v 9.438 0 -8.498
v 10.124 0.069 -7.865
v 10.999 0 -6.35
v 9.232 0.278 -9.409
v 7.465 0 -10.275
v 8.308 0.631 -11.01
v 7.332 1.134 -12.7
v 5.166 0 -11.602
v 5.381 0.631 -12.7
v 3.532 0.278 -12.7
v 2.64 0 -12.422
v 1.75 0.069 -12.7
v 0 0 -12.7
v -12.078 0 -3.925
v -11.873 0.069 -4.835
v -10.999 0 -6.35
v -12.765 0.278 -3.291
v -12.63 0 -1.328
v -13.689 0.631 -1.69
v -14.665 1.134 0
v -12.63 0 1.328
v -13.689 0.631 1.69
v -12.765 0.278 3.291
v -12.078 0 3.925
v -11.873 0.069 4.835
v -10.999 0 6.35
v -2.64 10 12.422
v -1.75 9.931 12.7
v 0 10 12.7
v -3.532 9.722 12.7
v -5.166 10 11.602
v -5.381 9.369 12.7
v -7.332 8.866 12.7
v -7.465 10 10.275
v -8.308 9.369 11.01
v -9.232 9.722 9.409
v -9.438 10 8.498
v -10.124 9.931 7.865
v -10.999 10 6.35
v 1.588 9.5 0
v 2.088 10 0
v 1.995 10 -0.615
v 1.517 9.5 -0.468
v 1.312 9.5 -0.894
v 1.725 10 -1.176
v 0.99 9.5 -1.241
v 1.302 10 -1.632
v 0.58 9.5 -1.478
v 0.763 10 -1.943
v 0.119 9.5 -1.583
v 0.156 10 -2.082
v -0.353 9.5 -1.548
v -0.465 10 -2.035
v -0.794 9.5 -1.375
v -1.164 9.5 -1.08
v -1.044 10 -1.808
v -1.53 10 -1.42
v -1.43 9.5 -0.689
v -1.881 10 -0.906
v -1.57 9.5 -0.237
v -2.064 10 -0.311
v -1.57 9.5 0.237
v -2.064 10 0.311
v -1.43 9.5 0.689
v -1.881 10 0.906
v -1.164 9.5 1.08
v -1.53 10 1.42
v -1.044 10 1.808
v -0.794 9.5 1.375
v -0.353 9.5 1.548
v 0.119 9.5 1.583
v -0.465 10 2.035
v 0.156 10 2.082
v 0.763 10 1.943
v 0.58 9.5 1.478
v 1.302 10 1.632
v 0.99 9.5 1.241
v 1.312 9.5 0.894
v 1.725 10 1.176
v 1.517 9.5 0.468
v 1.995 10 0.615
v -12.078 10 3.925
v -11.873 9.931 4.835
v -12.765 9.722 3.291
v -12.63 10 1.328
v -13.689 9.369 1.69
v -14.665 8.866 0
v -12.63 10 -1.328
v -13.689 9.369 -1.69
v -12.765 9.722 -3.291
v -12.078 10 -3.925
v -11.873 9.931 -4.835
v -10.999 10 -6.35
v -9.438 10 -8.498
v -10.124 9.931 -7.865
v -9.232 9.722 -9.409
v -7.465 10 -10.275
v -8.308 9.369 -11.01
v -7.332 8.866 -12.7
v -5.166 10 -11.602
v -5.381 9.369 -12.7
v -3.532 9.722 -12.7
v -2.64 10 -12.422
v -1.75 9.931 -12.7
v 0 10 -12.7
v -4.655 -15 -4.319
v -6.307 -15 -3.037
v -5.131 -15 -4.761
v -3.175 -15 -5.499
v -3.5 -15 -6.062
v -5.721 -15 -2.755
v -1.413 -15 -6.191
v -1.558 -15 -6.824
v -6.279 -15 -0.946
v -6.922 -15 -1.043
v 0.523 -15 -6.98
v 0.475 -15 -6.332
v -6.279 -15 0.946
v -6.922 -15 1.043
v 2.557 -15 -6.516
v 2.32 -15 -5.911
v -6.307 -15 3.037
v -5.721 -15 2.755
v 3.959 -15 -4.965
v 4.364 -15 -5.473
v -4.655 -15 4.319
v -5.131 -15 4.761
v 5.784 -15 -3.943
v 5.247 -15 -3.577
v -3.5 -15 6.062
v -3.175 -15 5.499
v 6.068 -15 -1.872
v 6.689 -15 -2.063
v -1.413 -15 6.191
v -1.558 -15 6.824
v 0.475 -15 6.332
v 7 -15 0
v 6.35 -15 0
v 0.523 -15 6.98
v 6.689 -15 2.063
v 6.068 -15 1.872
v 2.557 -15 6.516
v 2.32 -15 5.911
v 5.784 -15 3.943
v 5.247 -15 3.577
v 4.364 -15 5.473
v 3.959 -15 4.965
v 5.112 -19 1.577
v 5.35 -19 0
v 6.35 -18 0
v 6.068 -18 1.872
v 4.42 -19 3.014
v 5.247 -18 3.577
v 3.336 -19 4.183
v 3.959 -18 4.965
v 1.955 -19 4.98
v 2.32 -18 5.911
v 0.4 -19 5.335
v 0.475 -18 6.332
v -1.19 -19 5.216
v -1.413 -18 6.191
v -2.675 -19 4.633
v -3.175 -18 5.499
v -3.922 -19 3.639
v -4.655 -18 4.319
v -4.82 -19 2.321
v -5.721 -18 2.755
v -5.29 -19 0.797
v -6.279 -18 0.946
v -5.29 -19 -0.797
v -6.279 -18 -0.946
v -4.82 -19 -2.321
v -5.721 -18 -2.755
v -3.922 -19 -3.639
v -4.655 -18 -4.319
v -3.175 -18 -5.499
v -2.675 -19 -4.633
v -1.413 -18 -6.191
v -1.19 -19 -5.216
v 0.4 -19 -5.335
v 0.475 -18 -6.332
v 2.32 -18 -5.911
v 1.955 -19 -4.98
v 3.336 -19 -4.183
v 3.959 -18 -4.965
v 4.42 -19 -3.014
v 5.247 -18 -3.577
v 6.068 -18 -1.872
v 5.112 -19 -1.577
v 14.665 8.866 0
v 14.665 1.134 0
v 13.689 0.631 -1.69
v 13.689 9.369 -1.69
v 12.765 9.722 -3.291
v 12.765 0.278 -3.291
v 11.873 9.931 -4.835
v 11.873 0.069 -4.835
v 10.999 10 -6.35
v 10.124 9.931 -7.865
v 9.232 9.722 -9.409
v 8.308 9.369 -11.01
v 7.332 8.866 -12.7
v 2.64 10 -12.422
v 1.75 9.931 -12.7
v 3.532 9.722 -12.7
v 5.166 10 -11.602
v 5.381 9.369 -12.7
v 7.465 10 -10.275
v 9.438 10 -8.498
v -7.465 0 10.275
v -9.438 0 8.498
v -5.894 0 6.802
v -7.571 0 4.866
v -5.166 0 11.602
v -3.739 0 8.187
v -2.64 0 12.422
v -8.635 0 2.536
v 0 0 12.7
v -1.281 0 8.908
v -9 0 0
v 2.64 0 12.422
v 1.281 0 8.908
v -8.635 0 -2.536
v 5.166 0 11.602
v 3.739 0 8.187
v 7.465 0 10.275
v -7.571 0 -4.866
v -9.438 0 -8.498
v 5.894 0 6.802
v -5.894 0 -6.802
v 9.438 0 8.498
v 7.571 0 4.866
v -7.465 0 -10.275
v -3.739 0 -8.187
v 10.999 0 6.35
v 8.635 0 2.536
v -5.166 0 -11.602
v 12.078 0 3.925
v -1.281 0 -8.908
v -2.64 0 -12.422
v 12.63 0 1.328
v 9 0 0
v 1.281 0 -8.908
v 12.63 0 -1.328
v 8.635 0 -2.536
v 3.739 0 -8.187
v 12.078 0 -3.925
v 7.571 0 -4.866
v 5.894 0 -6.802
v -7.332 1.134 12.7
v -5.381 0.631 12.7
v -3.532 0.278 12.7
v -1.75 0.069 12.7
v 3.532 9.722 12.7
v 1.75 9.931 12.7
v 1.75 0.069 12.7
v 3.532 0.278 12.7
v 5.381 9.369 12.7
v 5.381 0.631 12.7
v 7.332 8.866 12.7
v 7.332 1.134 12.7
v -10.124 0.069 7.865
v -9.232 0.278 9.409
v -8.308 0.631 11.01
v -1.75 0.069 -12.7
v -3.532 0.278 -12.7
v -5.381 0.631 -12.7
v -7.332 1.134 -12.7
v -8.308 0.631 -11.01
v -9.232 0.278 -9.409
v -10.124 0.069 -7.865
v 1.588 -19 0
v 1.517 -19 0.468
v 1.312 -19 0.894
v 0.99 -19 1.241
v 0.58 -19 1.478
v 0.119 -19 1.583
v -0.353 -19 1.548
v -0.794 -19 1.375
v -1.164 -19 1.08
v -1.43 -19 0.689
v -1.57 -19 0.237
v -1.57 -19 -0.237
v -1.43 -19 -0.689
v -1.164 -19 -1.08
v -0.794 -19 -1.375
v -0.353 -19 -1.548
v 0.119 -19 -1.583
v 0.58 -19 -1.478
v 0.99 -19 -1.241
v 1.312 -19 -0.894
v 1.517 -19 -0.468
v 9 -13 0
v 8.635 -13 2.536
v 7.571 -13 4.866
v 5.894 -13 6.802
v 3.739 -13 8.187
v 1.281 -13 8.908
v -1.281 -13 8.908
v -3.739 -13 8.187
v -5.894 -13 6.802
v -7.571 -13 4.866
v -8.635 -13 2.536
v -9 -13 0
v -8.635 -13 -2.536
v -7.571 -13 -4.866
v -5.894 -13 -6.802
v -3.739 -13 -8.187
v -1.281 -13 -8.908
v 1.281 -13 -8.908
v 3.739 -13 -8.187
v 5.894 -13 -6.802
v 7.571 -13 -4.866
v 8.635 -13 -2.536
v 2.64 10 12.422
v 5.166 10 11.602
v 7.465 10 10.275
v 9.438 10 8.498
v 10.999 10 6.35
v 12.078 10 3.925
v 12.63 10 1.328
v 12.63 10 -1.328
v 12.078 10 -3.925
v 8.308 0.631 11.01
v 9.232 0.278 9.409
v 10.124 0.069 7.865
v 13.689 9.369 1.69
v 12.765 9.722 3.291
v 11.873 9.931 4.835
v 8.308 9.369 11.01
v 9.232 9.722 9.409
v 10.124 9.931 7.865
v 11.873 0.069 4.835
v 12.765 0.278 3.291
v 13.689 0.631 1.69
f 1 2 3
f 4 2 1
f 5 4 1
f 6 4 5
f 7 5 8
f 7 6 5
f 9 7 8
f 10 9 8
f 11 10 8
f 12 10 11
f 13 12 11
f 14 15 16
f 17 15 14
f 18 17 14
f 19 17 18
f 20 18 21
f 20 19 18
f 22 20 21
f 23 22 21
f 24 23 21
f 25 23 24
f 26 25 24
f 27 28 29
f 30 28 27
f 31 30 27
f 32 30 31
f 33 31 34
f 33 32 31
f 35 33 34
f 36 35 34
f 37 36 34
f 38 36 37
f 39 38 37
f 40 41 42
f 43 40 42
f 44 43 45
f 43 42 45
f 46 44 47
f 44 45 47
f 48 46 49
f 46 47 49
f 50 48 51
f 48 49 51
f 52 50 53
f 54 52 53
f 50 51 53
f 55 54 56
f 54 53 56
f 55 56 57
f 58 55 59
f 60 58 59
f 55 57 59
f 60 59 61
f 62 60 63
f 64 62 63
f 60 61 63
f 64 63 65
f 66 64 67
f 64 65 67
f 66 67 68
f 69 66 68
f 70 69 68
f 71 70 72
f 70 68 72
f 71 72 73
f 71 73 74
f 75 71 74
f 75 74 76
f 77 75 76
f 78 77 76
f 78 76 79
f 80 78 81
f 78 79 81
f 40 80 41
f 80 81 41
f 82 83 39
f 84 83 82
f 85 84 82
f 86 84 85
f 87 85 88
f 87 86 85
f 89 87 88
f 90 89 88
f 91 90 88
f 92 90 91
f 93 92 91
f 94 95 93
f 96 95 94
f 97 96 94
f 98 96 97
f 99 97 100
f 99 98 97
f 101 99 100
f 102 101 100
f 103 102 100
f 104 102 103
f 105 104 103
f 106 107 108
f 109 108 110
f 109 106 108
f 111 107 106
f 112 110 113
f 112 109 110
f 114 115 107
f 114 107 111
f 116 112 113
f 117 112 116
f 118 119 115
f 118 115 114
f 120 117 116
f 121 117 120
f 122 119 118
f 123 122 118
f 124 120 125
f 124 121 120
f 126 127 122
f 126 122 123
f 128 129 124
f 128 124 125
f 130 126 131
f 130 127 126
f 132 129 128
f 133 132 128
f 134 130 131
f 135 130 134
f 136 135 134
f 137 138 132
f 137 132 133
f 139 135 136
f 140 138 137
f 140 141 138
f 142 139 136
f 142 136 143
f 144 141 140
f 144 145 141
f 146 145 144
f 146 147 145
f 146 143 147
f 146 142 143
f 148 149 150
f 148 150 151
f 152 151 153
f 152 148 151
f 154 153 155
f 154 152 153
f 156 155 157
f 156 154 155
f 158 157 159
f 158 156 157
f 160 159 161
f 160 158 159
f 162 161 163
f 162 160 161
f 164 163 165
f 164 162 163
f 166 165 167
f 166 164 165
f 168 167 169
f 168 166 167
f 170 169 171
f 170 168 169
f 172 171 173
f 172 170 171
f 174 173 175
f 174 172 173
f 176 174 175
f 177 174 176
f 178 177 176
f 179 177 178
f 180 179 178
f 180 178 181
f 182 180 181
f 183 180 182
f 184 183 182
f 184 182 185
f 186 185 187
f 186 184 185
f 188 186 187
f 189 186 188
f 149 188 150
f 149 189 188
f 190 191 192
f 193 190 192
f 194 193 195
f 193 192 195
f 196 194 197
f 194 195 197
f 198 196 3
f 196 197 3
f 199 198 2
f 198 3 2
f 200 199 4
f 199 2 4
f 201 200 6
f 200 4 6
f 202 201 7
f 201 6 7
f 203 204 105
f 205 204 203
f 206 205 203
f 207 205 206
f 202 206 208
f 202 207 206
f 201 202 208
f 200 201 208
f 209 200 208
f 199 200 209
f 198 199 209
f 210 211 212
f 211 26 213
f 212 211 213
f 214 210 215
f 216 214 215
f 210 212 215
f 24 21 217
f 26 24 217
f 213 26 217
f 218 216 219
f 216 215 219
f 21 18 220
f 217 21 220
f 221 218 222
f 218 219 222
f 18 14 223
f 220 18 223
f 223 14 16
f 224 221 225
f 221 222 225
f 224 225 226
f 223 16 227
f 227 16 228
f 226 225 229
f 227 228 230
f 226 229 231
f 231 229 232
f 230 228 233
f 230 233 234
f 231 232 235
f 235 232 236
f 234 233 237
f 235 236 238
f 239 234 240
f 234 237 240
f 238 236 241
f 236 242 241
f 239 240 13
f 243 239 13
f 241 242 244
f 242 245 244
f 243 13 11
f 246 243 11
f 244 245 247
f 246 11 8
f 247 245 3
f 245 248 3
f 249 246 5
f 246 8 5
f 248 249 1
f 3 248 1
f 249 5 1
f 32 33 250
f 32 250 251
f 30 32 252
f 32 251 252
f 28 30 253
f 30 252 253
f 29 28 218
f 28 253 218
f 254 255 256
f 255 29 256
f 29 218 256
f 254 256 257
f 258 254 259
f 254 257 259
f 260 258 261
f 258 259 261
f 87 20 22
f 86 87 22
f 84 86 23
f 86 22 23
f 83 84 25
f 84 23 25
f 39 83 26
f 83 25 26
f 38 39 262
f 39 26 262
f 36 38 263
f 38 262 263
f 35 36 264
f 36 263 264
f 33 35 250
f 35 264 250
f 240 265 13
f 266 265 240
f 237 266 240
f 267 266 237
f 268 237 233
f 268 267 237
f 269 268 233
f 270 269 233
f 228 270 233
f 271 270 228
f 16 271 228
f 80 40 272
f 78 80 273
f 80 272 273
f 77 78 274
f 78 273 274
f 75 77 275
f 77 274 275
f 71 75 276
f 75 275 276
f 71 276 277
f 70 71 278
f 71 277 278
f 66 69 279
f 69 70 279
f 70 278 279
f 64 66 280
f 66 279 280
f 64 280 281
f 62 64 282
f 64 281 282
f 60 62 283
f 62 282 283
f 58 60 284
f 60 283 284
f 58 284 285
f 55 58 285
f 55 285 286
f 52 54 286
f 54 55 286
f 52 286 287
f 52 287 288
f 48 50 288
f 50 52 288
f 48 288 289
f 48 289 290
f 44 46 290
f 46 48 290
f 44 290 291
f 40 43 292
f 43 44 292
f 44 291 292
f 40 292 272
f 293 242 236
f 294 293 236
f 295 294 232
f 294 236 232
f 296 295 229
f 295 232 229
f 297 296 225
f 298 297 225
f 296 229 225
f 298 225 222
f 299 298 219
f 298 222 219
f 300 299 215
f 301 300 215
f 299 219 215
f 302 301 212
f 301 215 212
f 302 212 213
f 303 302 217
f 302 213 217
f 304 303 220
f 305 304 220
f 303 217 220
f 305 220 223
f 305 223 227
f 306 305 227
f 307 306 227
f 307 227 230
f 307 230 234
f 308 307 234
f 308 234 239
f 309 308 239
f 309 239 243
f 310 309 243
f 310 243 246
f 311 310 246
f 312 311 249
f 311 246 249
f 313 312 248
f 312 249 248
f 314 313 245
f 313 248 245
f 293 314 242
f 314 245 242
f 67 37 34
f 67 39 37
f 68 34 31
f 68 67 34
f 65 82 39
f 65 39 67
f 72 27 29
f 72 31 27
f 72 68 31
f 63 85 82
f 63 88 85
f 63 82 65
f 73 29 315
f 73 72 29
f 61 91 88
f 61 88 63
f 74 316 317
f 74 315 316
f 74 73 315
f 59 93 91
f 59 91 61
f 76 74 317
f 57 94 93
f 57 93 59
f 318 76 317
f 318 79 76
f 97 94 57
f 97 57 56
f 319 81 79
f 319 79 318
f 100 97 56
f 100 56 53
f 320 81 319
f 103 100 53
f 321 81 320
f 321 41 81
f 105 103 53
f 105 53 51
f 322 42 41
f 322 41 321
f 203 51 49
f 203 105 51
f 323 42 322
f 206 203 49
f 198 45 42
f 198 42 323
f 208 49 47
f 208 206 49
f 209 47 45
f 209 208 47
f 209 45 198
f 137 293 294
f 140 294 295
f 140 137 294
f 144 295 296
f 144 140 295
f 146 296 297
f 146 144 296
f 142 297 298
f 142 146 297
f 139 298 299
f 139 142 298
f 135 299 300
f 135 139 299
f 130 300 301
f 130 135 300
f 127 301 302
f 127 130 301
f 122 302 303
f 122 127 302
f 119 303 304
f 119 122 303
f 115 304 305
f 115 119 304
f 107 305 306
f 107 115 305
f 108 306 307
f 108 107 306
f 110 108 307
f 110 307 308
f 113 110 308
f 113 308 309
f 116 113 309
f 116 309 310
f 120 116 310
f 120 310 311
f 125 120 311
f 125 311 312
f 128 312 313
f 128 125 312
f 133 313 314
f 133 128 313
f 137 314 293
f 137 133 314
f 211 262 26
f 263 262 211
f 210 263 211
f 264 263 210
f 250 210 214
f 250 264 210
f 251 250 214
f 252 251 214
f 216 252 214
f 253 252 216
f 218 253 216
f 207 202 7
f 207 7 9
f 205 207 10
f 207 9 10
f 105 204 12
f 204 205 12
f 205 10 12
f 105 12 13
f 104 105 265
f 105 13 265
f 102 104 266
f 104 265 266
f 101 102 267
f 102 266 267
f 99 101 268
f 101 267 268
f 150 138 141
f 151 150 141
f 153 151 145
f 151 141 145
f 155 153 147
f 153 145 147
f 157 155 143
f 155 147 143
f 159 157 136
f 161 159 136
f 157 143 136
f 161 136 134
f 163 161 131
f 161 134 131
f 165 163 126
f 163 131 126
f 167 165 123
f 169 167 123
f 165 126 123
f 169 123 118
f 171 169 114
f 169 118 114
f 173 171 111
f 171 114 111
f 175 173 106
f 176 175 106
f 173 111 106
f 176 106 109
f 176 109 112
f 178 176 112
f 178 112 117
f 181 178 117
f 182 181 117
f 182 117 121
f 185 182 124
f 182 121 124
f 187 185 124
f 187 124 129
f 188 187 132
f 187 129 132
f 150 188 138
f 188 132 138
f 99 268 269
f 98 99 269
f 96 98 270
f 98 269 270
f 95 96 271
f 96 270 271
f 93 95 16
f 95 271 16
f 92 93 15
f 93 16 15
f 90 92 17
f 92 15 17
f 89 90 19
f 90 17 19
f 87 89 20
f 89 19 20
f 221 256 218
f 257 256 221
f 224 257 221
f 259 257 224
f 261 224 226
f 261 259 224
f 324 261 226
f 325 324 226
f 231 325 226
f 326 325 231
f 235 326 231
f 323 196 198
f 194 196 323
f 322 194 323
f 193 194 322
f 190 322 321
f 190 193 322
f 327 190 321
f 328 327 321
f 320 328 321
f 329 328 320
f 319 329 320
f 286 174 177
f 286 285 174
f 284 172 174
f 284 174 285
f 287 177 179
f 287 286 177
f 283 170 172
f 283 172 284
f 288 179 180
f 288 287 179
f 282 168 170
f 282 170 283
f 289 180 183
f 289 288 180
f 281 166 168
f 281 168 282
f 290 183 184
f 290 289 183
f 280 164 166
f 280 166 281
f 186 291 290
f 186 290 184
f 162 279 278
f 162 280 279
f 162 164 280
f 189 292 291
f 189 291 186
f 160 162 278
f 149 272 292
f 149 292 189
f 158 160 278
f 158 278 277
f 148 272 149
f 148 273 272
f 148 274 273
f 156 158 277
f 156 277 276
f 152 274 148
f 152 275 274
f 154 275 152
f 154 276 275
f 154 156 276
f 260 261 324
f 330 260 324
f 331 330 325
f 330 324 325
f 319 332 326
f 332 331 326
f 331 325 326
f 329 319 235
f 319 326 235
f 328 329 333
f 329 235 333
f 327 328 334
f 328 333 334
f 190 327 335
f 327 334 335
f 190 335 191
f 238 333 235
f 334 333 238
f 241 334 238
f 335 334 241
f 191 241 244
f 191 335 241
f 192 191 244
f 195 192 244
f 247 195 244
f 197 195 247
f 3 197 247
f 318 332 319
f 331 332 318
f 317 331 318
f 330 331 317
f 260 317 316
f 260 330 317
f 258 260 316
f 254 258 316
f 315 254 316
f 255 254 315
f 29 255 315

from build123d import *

# Parameters (mm, degrees)
SALIENTE_EXTRUIR3_DEPTH = 10
CROQUIS5_OUTSIDE_W      = 73.984
CROQUIS5_OUTSIDE_H      = 70.054
CROQUIS5_OUTSIDE_R      = 12.7
CORTAR_EXTRUIR4_DEPTH   = 10
CORTAR_EXTRUIR4_TAPER   = 60
CROQUIS6_OUTSIDE_W      = 73.984
CROQUIS6_OUTSIDE_H      = 70.054
CROQUIS6_OUTSIDE_R      = 12.7
CORTAR_EXTRUIR5_DEPTH   = 10
CORTAR_EXTRUIR5_TAPER   = 60
CROQUIS7_R              = 9
SALIENTE_EXTRUIR4_DEPTH = 15
CHAFL_N1_SIZE           = 2
CROQUIS8_R              = 1.5875
CORTAR_EXTRUIR6_DEPTH   = 26
CHAFL_N2_SIZE           = 0.5
CROQUIS9_R              = 6.35
SALIENTE_EXTRUIR5_DEPTH = 4
CHAFL_N4_SIZE           = 1
CROQUIS10_R             = 1.5875
CORTAR_EXTRUIR7_DEPTH   = 14


with BuildPart() as part:
    # Croquis1 → Saliente-Extruir3 (new body)
    with BuildSketch(Plane(origin=(0, 0, 0), x_dir=(1, 0, 0), z_dir=(0, 1, 0))):
        Polygon((14.664696837, 0), (7.332348419, 12.7), (-7.332348419, 12.7), (-14.664696837, 0), (-7.332348419, -12.7), (7.332348419, -12.7), align=None)
    extrude(amount=SALIENTE_EXTRUIR3_DEPTH)

    # Croquis5 outside → Cortar-Extruir4 (cut)
    with BuildSketch(Plane.XZ):
        Rectangle(CROQUIS5_OUTSIDE_W, CROQUIS5_OUTSIDE_H)
        Circle(CROQUIS5_OUTSIDE_R, mode=Mode.SUBTRACT)
    extrude(amount=-CORTAR_EXTRUIR4_DEPTH, taper=CORTAR_EXTRUIR4_TAPER, mode=Mode.SUBTRACT)

    # Croquis6 outside → Cortar-Extruir5 (cut)
    with BuildSketch(Plane(origin=(0, 10, 0), x_dir=(1, 0, 0), z_dir=(0, 1, 0))):
        Rectangle(CROQUIS6_OUTSIDE_W, CROQUIS6_OUTSIDE_H)
        Circle(CROQUIS6_OUTSIDE_R, mode=Mode.SUBTRACT)
    extrude(amount=-CORTAR_EXTRUIR5_DEPTH, taper=CORTAR_EXTRUIR5_TAPER, mode=Mode.SUBTRACT)

    # Croquis7 → Saliente-Extruir4 (add)
    with BuildSketch(Plane.XZ):
        Circle(CROQUIS7_R)
    extrude(amount=SALIENTE_EXTRUIR4_DEPTH)

    # Chaflán1
    chafl_n1_edges = [part.edges().sort_by_distance(p)[0] for p in [
        (-9, -15, 0),
    ]]
    chamfer(chafl_n1_edges, length=CHAFL_N1_SIZE)

    # Croquis8 → Cortar-Extruir6 (cut)
    with BuildSketch(Plane(origin=(0, 10, 0), x_dir=(1, 0, 0), z_dir=(0, 1, 0))):
        Circle(CROQUIS8_R)
    extrude(amount=-CORTAR_EXTRUIR6_DEPTH, mode=Mode.SUBTRACT)

    # Chaflán2
    chafl_n2_edges = [part.edges().sort_by_distance(p)[0] for p in [
        (-1.5875, 10, 0),
    ]]
    chamfer(chafl_n2_edges, length=CHAFL_N2_SIZE)

    # Croquis9 → Saliente-Extruir5 (add)
    with BuildSketch(Plane.XZ.offset(15)):
        Circle(CROQUIS9_R)
    extrude(amount=SALIENTE_EXTRUIR5_DEPTH)

    # Chaflán4
    chafl_n4_edges = [part.edges().sort_by_distance(p)[0] for p in [
        (-6.35, -19, 0),
    ]]
    chamfer(chafl_n4_edges, length=CHAFL_N4_SIZE)

    # Croquis10 → Cortar-Extruir7 (cut)
    with BuildSketch(Plane.XZ.offset(19)):
        Circle(CROQUIS10_R)
    extrude(amount=-CORTAR_EXTRUIR7_DEPTH, mode=Mode.SUBTRACT)


solid = part.part
